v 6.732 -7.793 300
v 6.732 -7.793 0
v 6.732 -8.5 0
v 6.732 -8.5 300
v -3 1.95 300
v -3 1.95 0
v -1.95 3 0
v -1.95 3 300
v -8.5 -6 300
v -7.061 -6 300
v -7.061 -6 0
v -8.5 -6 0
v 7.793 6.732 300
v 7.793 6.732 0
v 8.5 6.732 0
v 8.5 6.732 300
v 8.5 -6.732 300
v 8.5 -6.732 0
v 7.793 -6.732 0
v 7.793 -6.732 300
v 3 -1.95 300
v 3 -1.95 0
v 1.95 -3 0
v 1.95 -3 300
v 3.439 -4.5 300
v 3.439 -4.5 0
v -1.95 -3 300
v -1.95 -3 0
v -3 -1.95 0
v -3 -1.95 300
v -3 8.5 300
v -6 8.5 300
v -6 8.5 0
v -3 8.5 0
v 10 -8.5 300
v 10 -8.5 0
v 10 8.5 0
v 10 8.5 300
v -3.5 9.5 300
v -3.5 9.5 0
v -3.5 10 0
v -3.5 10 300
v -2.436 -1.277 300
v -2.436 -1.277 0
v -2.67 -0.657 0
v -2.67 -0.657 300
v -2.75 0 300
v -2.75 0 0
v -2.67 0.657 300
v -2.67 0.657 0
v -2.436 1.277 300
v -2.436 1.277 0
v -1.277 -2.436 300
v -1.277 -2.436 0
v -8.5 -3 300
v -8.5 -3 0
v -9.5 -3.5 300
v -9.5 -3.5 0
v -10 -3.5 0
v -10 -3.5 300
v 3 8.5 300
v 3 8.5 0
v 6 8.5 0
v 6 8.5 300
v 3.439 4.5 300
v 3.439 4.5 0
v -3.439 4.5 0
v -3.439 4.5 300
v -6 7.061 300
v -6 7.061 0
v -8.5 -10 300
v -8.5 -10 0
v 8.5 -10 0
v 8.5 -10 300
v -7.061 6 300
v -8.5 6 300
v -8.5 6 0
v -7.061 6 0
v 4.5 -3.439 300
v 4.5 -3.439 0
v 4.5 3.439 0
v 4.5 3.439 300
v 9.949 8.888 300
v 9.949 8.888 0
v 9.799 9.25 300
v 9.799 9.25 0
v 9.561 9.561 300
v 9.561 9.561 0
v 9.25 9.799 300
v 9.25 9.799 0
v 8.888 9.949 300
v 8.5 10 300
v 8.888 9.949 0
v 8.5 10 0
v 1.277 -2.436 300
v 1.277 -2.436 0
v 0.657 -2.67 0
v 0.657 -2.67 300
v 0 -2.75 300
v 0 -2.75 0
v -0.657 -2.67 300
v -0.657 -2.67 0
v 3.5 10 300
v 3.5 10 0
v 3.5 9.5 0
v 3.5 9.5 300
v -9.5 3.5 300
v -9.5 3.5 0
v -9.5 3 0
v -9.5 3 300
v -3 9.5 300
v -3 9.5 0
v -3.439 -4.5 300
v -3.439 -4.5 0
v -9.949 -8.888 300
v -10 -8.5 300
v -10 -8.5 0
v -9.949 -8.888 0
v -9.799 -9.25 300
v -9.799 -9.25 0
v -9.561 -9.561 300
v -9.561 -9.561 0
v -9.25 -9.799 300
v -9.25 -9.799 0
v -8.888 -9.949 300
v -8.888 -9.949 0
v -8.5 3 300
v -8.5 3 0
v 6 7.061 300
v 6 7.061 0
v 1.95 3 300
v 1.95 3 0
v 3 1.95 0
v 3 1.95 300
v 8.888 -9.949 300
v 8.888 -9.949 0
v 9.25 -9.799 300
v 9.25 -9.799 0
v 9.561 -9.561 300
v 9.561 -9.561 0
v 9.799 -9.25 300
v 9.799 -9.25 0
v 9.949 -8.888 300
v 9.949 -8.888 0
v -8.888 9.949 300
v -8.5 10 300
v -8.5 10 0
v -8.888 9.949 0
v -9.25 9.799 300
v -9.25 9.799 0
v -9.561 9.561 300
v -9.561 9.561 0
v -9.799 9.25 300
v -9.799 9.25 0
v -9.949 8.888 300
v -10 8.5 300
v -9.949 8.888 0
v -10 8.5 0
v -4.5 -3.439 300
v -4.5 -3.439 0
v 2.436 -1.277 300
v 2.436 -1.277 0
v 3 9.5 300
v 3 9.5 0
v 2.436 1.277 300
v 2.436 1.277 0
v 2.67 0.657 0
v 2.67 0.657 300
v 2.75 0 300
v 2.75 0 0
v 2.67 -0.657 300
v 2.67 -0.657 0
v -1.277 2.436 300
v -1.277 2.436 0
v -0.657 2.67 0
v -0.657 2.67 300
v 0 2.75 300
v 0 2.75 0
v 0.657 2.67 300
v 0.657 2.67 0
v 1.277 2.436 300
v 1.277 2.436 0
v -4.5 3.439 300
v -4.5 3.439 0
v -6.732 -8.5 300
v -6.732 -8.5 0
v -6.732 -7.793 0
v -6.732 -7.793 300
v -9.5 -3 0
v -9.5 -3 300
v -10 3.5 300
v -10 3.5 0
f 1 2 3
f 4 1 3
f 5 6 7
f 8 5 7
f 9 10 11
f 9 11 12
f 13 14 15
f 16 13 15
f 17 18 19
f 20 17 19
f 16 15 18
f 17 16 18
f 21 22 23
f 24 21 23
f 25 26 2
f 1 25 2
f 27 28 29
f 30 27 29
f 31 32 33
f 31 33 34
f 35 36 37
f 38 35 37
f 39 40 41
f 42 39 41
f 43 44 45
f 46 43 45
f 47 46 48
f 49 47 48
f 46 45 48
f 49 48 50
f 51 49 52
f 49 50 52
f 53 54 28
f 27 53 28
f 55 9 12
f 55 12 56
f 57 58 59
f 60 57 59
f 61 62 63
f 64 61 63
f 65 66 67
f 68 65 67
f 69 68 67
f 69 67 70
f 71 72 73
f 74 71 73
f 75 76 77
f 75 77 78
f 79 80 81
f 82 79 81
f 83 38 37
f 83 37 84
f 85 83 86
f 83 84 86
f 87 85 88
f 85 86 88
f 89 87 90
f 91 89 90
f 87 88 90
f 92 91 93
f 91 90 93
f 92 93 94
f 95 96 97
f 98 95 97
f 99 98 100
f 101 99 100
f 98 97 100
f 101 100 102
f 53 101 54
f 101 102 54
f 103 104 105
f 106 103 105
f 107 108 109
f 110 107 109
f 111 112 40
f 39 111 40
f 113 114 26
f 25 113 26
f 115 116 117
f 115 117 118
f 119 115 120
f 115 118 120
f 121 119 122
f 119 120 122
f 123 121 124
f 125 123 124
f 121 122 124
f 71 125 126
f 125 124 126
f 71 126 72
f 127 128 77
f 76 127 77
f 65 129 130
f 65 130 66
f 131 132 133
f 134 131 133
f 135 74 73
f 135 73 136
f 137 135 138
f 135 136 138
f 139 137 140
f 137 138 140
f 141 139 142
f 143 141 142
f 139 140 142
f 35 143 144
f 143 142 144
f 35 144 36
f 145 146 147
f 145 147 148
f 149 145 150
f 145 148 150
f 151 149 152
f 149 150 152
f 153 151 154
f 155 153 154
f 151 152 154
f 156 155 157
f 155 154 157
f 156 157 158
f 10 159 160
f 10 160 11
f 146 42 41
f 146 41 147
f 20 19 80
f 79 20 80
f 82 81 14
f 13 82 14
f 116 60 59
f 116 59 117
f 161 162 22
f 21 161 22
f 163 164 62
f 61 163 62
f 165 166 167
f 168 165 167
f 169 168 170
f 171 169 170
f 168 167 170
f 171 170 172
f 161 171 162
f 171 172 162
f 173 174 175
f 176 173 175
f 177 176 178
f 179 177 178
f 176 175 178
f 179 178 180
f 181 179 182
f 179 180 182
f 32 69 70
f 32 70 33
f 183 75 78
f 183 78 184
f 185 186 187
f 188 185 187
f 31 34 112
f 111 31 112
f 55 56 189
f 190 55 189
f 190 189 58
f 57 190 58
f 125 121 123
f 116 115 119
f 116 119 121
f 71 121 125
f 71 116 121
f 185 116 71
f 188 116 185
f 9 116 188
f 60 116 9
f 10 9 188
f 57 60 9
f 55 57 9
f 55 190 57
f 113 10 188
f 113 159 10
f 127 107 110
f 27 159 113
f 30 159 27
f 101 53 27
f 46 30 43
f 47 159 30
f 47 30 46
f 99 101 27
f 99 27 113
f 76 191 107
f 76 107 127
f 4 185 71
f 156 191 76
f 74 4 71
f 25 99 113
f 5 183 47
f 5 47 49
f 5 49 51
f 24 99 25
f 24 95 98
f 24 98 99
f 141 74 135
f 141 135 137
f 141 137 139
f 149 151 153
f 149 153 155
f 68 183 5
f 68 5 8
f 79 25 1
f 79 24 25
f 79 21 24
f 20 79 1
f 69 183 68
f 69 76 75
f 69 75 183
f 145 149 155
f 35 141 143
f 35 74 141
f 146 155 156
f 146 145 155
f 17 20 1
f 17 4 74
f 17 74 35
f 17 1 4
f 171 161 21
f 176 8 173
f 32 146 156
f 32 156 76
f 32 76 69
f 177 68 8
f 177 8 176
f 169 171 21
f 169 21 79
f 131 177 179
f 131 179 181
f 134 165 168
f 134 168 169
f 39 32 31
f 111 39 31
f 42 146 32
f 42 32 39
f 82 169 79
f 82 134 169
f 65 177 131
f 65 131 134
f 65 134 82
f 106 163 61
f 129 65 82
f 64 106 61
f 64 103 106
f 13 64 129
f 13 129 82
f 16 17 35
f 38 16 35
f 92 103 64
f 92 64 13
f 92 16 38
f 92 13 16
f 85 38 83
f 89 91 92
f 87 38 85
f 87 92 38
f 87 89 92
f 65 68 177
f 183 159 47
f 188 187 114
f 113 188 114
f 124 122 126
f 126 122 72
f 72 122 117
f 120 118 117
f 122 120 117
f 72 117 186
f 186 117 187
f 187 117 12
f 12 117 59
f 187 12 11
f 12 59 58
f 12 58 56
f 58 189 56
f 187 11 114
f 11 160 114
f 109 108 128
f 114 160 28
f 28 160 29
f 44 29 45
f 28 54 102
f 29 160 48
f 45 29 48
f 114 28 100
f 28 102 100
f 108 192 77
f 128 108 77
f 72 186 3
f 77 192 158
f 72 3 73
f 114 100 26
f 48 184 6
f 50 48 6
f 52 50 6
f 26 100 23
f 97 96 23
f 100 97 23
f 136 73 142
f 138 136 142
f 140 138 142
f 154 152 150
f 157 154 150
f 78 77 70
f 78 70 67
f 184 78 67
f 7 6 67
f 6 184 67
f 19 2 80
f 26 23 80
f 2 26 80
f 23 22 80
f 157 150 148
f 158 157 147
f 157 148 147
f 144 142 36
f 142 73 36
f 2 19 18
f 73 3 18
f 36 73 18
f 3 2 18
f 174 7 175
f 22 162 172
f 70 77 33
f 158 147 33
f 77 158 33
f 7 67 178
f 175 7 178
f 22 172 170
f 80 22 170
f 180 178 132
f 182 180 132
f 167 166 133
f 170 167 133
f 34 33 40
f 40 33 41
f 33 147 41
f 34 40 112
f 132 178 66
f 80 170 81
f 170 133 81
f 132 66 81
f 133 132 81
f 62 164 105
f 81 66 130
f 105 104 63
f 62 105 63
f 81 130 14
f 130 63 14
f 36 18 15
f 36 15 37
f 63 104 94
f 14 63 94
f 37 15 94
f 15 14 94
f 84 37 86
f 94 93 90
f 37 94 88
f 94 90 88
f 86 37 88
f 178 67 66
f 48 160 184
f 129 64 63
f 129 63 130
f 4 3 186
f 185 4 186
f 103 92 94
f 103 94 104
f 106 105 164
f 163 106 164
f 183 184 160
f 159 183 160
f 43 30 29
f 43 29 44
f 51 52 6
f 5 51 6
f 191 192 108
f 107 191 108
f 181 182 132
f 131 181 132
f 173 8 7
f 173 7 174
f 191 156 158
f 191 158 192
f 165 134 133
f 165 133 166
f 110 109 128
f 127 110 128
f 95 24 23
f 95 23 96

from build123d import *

# Parameters (mm, degrees)
BOSS_EXTRUDE1_DEPTH = 1000
CUT_EXTRUDE1_DEPTH  = 700


with BuildPart() as part:
    # Sketch1 → Boss-Extrude1 (new body)
    with BuildSketch(Plane.XY):
        with BuildLine():
            Line((6, 7.06066017), (3.43933983, 4.5))
            Line((3.43933983, 4.5), (-3.43933983, 4.5))
            Line((-3.43933983, 4.5), (-6, 7.06066017))
            Line((-6, 7.06066017), (-6, 8.5))
            Line((-6, 8.5), (-3, 8.5))
            Line((-3, 8.5), (-3, 9.5))
            Line((-3, 9.5), (-3.5, 9.5))
            Line((-3.5, 9.5), (-3.5, 10))
            Line((-3.5, 10), (-8.5, 10))
            ThreePointArc((-8.5, 10), (-9.56066017, 9.56066017), (-10, 8.5))
            Line((-10, 8.5), (-10, 3.5))
            Line((-10, 3.5), (-9.5, 3.5))
            Line((-9.5, 3.5), (-9.5, 3))
            Line((-9.5, 3), (-8.5, 3))
            Line((-8.5, 3), (-8.5, 6))
            Line((-8.5, 6), (-7.06066017, 6))
            Line((-7.06066017, 6), (-4.5, 3.43933983))
            Line((-4.5, 3.43933983), (-4.5, -3.43933983))
            Line((-4.5, -3.43933983), (-7.06066017, -6))
            Line((-7.06066017, -6), (-8.5, -6))
            Line((-8.5, -6), (-8.5, -3))
            Line((-8.5, -3), (-9.5, -3))
            Line((-9.5, -3), (-9.5, -3.5))
            Line((-9.5, -3.5), (-10, -3.5))
            Line((-10, -3.5), (-10, -8.5))
            ThreePointArc((-10, -8.5), (-9.56066017, -9.56066017), (-8.5, -10))
            Line((-8.5, -10), (8.5, -10))
            ThreePointArc((8.5, -10), (9.56066017, -9.56066017), (10, -8.5))
            Line((10, -8.5), (10, 8.5))
            ThreePointArc((10, 8.5), (9.56066017, 9.56066017), (8.5, 10))
            Line((8.5, 10), (3.5, 10))
            Line((3.5, 10), (3.5, 9.5))
            Line((3.5, 9.5), (3, 9.5))
            Line((3, 9.5), (3, 8.5))
            Line((3, 8.5), (6, 8.5))
            Line((6, 8.5), (6, 7.06066017))
        make_face()
        Polygon((4.5, -3.43933983), (4.5, 3.43933983), (7.79289322, 6.73223305), (8.5, 6.73223305), (8.5, -6.73223305), (7.79289322, -6.73223305), align=None, mode=Mode.SUBTRACT)
        with BuildLine():
            Line((-2.43563636, 1.27678327), (-3.0001742, 1.94957327))
            Line((-3.0001742, 1.94957327), (-1.94957327, 3.0001742))
            Line((-1.94957327, 3.0001742), (-1.27678327, 2.43563636))
            ThreePointArc((-1.27678327, 2.43563636), (0, 2.75), (1.27678327, 2.43563636))
            Line((1.27678327, 2.43563636), (1.94957327, 3.0001742))
            Line((1.94957327, 3.0001742), (3.0001742, 1.94957327))
            Line((3.0001742, 1.94957327), (2.43563636, 1.27678327))
            ThreePointArc((2.43563636, 1.27678327), (2.75, 0), (2.43563636, -1.27678327))
            Line((2.43563636, -1.27678327), (3.0001742, -1.94957327))
            Line((3.0001742, -1.94957327), (1.94957327, -3.0001742))
            Line((1.94957327, -3.0001742), (1.27678327, -2.43563636))
            ThreePointArc((1.27678327, -2.43563636), (0, -2.75), (-1.27678327, -2.43563636))
            Line((-1.27678327, -2.43563636), (-1.94957327, -3.0001742))
            Line((-1.94957327, -3.0001742), (-3.0001742, -1.94957327))
            Line((-3.0001742, -1.94957327), (-2.43563636, -1.27678327))
            ThreePointArc((-2.43563636, -1.27678327), (-2.75, 0), (-2.43563636, 1.27678327))
        make_face(mode=Mode.SUBTRACT)
        Polygon((3.43933983, -4.5), (6.73223305, -7.79289322), (6.73223305, -8.5), (-6.73223305, -8.5), (-6.73223305, -7.79289322), (-3.43933983, -4.5), align=None, mode=Mode.SUBTRACT)
    extrude(amount=BOSS_EXTRUDE1_DEPTH)

    # Sketch3 → Cut-Extrude1 (cut)
    with BuildSketch(Plane.XY.offset(1000)):
        with BuildLine():
            Line((6, 8.5), (6, 7.06066017))
            Line((6, 7.06066017), (3.43933983, 4.5))
            Line((3.43933983, 4.5), (-3.43933983, 4.5))
            Line((-3.43933983, 4.5), (-6, 7.06066017))
            Line((-6, 7.06066017), (-6, 8.5))
            Line((-6, 8.5), (-3, 8.5))
            Line((-3, 8.5), (-3, 9.5))
            Line((-3, 9.5), (-3.5, 9.5))
            Line((-3.5, 9.5), (-3.5, 10))
            Line((-3.5, 10), (-8.5, 10))
            ThreePointArc((-8.5, 10), (-9.56066017, 9.56066017), (-10, 8.5))
            Line((-10, 8.5), (-10, 3.5))
            Line((-10, 3.5), (-9.5, 3.5))
            Line((-9.5, 3.5), (-9.5, 3))
            Line((-9.5, 3), (-8.5, 3))
            Line((-8.5, 3), (-8.5, 6))
            Line((-8.5, 6), (-7.06066017, 6))
            Line((-7.06066017, 6), (-4.5, 3.43933983))
            Line((-4.5, 3.43933983), (-4.5, -3.43933983))
            Line((-4.5, -3.43933983), (-7.06066017, -6))
            Line((-7.06066017, -6), (-8.5, -6))
            Line((-8.5, -6), (-8.5, -3))
            Line((-8.5, -3), (-9.5, -3))
            Line((-9.5, -3), (-9.5, -3.5))
            Line((-9.5, -3.5), (-10, -3.5))
            Line((-10, -3.5), (-10, -8.5))
            ThreePointArc((-10, -8.5), (-9.56066017, -9.56066017), (-8.5, -10))
            Line((-8.5, -10), (8.5, -10))
            ThreePointArc((8.5, -10), (9.56066017, -9.56066017), (10, -8.5))
            Line((10, -8.5), (10, 8.5))
            ThreePointArc((10, 8.5), (9.56066017, 9.56066017), (8.5, 10))
            Line((8.5, 10), (3.5, 10))
            Line((3.5, 10), (3.5, 9.5))
            Line((3.5, 9.5), (3, 9.5))
            Line((3, 9.5), (3, 8.5))
            Line((3, 8.5), (6, 8.5))
        make_face()
    extrude(amount=-CUT_EXTRUDE1_DEPTH, mode=Mode.SUBTRACT)


solid = part.part
